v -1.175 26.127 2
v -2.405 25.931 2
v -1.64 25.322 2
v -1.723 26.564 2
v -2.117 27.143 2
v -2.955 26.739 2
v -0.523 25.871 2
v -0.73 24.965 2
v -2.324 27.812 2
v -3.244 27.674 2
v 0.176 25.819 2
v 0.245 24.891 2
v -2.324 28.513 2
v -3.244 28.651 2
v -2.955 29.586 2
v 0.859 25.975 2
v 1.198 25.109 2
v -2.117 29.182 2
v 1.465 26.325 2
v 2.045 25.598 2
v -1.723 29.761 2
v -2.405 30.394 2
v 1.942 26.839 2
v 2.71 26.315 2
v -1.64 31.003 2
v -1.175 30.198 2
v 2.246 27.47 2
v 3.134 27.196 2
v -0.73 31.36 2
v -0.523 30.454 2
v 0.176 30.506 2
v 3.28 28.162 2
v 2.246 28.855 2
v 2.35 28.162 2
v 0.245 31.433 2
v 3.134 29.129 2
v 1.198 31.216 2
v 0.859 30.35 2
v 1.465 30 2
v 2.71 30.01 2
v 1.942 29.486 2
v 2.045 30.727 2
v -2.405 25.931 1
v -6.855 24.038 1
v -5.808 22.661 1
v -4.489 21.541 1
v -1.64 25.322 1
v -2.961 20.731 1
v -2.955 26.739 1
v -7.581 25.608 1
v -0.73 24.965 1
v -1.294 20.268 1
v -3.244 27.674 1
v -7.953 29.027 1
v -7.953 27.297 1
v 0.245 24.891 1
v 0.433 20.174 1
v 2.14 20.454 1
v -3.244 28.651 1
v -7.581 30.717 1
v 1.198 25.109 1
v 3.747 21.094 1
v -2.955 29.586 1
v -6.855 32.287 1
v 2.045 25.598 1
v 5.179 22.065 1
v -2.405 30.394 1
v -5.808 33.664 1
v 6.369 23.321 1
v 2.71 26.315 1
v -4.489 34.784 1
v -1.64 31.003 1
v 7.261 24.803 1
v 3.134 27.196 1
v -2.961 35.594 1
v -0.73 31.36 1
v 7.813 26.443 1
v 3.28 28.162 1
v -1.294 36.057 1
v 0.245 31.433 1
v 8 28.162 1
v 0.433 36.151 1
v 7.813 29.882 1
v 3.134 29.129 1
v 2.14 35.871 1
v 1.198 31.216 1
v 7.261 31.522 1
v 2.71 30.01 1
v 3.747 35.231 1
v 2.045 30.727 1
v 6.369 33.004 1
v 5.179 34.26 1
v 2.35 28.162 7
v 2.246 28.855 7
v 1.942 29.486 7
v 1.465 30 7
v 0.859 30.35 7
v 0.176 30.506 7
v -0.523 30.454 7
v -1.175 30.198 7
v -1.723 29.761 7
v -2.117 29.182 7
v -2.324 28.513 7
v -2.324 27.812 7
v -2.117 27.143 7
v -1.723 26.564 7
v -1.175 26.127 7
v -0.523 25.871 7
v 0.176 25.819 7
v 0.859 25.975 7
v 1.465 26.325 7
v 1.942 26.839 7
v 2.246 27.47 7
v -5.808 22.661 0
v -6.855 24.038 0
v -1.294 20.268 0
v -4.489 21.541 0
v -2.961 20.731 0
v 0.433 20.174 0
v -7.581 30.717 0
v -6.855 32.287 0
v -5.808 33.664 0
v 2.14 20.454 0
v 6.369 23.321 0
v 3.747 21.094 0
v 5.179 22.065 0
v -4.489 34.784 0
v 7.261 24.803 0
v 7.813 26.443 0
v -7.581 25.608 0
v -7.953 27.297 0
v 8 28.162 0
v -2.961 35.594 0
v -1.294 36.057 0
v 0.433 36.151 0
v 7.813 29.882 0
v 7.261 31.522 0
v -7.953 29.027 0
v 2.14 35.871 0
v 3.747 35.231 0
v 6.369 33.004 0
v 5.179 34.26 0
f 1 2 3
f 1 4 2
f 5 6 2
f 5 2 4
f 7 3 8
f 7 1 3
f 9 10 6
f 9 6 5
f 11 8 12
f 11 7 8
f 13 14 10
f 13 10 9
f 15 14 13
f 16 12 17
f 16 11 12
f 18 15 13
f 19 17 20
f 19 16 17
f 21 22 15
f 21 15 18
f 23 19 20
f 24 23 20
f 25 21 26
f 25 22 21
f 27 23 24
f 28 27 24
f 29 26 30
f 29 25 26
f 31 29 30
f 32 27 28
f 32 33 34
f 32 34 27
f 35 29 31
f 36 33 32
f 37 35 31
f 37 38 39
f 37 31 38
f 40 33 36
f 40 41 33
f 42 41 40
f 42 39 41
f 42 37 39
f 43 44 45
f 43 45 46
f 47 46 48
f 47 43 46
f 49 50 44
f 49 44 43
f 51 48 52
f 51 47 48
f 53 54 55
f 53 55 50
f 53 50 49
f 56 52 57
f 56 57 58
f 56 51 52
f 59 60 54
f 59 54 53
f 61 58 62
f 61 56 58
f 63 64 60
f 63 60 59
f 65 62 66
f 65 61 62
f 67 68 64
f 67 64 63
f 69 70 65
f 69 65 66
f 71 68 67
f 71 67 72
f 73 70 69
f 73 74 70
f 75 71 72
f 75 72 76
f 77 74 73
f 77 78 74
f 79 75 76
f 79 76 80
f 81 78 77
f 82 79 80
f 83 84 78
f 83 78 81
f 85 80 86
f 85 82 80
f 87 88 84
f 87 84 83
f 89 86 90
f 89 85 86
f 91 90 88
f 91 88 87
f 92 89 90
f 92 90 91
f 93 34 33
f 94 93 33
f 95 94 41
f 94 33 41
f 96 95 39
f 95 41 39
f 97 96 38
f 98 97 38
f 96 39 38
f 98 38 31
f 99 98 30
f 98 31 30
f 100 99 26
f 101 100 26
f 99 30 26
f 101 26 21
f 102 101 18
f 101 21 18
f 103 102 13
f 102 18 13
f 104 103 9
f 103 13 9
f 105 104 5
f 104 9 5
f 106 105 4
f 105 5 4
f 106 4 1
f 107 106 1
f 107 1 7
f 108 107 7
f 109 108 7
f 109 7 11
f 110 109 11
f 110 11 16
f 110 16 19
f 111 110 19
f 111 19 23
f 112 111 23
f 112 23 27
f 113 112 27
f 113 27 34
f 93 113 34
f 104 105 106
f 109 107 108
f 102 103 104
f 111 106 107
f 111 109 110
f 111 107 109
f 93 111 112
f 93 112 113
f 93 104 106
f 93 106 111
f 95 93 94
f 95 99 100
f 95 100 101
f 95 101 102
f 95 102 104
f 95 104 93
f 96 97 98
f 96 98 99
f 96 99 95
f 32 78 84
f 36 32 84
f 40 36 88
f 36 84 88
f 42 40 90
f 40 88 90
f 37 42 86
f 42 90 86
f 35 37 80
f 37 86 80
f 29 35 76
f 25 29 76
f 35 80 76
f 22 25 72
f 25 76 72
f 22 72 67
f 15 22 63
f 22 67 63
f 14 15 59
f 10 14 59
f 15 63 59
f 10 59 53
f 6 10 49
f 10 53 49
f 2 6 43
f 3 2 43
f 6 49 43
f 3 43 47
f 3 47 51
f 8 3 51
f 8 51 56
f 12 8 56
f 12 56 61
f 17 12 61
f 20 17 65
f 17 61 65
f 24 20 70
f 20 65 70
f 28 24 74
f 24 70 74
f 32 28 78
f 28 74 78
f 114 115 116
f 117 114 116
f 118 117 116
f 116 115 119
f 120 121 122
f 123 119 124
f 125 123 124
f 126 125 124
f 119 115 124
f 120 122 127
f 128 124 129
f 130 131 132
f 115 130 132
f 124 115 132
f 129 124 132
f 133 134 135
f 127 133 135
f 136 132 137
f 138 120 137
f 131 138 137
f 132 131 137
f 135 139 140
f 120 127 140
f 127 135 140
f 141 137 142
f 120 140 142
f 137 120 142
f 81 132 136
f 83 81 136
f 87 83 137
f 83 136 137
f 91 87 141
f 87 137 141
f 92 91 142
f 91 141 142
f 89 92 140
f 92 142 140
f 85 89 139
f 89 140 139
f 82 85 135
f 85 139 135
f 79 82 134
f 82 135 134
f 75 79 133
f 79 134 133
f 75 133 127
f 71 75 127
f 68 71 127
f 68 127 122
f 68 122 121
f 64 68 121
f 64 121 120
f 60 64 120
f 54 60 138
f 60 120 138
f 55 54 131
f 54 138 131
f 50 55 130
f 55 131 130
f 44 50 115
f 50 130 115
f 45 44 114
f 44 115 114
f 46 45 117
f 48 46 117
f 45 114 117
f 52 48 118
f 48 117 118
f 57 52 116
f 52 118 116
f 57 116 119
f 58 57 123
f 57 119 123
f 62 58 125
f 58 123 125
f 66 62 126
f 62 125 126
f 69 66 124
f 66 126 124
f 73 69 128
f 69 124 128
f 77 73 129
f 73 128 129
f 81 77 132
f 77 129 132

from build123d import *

# Parameters (mm, degrees)
F1_R          = 8
F1_R_2        = 2.35
F2_DEPTH      = 1
F3_DEPTH      = 7
F4_DEPTH      = 1.1
F4_DEPTH_BACK = 0.1016
F7_R          = 3.280158
F7_R_2        = 2.35
F8_DEPTH      = 1


with BuildPart() as f2:
    # F1 (on Top) → F2 (new body)
    with BuildSketch(Plane.XY):
        with Locations((0, 28.162442)):
            Circle(F1_R)
        with Locations((0, 28.162442)):
            Circle(F1_R_2, mode=Mode.SUBTRACT)
        with Locations((0, 28.162442)):
            Circle(F1_R_2)
    extrude(amount=F2_DEPTH)

    # F1 (on Top) → F3 (join)
    with BuildSketch(Plane.XY):
        with Locations((0, 28.162442)):
            Circle(F1_R_2)
    extrude(amount=F3_DEPTH)

    # F7 (on face) → F8 (join)
    with BuildSketch(Plane.XY.offset(1)):
        with Locations((0, 28.162442)):
            Circle(F7_R)
        with Locations((0, 28.162442)):
            Circle(F7_R_2, mode=Mode.SUBTRACT)
    extrude(amount=F8_DEPTH)


with BuildPart() as f4:
    # F1 (on Top) → F4 (new body, two sides)
    with BuildSketch(Plane.XY) as f4_sk:
        with Locations((0, 28.162442)):
            Circle(F1_R)
        with Locations((0, 28.162442)):
            Circle(F1_R_2, mode=Mode.SUBTRACT)
        with Locations((0, 28.162442)):
            Circle(F1_R_2)
    extrude(amount=-F4_DEPTH)
    extrude(f4_sk.sketch, amount=-F4_DEPTH_BACK)


with BuildPart() as f4_1:
    # F5: moved
    add(f4.part.moved(Location((-18.7706, 0, 1.0922))))


solid = f2.part
